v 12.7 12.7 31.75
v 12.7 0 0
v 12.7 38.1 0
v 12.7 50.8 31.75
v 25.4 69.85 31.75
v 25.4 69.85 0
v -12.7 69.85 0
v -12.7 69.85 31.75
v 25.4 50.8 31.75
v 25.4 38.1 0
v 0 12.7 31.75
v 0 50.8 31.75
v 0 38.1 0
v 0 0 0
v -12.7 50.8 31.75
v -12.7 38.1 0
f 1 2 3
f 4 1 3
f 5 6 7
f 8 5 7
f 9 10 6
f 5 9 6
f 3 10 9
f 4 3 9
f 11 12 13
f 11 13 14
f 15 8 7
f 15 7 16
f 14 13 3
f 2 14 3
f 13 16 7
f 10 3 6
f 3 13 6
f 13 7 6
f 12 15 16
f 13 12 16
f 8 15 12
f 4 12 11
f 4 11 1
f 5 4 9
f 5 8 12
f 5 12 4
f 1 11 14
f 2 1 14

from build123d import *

# Parameters (mm, degrees)
F1_DEPTH = 31.75
F3_DEPTH = 25.4
F5_DEPTH = 12.7
F7_DEPTH = 12.7


with BuildPart() as f1:
    # F0 (on Top) → F1 (new body)
    with BuildSketch(Plane.XY):
        Polygon((0, 38.1), (0, 0), (12.7, 0), (12.7, 38.1), (25.4, 38.1), (25.4, 69.85), (-12.7, 69.85), (-12.7, 38.1), align=None)
    extrude(amount=F1_DEPTH)

    # F2 (on face) → F3 (cut)
    with BuildSketch(Plane(origin=(0, 0, 0), x_dir=(0, -1, 0), z_dir=(-1, 0, 0))):
        Polygon((0, 0), (0, 31.75), (-12.7, 31.75), align=None)
    extrude(amount=-F3_DEPTH, mode=Mode.SUBTRACT)

    # F4 (on face) → F5 (cut)
    with BuildSketch(Plane(origin=(-12.7, 0, 0), x_dir=(0, -1, 0), z_dir=(-1, 0, 0))):
        Polygon((-38.1, 0), (-38.1, 31.75), (-50.8, 31.75), align=None)
    extrude(amount=-F5_DEPTH, mode=Mode.SUBTRACT)

    # F6 (on face) → F7 (cut)
    with BuildSketch(Plane.YZ.offset(25.4)):
        Polygon((50.8, 31.75), (38.1, 31.75), (38.1, 0), align=None)
    extrude(amount=-F7_DEPTH, mode=Mode.SUBTRACT)


solid = f1.part
